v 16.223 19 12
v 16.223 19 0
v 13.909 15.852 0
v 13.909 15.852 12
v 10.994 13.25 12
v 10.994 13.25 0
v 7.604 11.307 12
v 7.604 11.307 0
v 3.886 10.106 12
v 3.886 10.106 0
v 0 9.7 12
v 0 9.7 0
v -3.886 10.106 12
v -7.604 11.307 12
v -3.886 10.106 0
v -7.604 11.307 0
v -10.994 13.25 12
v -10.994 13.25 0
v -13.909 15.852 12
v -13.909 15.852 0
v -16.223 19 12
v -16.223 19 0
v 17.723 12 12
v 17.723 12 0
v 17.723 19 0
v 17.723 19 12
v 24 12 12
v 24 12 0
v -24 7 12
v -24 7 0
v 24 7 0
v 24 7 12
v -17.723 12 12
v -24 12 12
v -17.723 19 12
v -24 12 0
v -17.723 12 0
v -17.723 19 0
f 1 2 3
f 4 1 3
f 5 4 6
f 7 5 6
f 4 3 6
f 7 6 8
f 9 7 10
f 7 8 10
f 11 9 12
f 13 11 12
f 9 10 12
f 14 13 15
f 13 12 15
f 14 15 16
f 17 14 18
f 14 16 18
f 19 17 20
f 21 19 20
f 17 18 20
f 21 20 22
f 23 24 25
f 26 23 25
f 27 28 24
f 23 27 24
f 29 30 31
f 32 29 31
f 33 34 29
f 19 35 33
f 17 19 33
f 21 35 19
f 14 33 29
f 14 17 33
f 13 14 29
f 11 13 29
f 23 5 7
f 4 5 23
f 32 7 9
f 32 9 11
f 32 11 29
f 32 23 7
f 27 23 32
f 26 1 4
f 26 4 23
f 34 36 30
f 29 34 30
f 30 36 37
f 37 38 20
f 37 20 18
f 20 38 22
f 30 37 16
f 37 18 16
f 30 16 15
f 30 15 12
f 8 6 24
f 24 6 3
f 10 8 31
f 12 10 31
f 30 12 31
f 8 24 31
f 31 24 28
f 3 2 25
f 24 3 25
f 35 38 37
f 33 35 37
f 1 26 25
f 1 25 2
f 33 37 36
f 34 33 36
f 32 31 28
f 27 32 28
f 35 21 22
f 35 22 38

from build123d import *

# Parameters (mm, degrees)
CYLINDRICAL_MOTOR_SEAT_DEPTH = 12


with BuildPart() as part:
    # Cylindrical motor seat profile → Cylindrical motor seat (new body)
    with BuildSketch(Plane.XY):
        with BuildLine():
            Line((-24, 7), (24, 7))
            Line((24, 7), (24, 12))
            Line((24, 12), (17.723131634, 12))
            Line((17.723131634, 12), (17.723131634, 19))
            Line((17.723131634, 19), (16.223131634, 19))
            ThreePointArc((16.223131634, 19), (0, 9.7), (-16.223131634, 19))
            Line((-16.223131634, 19), (-17.723131634, 19))
            Line((-17.723131634, 19), (-17.723131634, 12))
            Line((-17.723131634, 12), (-24, 12))
            Line((-24, 12), (-24, 7))
        make_face()
    extrude(amount=CYLINDRICAL_MOTOR_SEAT_DEPTH)


solid = part.part
